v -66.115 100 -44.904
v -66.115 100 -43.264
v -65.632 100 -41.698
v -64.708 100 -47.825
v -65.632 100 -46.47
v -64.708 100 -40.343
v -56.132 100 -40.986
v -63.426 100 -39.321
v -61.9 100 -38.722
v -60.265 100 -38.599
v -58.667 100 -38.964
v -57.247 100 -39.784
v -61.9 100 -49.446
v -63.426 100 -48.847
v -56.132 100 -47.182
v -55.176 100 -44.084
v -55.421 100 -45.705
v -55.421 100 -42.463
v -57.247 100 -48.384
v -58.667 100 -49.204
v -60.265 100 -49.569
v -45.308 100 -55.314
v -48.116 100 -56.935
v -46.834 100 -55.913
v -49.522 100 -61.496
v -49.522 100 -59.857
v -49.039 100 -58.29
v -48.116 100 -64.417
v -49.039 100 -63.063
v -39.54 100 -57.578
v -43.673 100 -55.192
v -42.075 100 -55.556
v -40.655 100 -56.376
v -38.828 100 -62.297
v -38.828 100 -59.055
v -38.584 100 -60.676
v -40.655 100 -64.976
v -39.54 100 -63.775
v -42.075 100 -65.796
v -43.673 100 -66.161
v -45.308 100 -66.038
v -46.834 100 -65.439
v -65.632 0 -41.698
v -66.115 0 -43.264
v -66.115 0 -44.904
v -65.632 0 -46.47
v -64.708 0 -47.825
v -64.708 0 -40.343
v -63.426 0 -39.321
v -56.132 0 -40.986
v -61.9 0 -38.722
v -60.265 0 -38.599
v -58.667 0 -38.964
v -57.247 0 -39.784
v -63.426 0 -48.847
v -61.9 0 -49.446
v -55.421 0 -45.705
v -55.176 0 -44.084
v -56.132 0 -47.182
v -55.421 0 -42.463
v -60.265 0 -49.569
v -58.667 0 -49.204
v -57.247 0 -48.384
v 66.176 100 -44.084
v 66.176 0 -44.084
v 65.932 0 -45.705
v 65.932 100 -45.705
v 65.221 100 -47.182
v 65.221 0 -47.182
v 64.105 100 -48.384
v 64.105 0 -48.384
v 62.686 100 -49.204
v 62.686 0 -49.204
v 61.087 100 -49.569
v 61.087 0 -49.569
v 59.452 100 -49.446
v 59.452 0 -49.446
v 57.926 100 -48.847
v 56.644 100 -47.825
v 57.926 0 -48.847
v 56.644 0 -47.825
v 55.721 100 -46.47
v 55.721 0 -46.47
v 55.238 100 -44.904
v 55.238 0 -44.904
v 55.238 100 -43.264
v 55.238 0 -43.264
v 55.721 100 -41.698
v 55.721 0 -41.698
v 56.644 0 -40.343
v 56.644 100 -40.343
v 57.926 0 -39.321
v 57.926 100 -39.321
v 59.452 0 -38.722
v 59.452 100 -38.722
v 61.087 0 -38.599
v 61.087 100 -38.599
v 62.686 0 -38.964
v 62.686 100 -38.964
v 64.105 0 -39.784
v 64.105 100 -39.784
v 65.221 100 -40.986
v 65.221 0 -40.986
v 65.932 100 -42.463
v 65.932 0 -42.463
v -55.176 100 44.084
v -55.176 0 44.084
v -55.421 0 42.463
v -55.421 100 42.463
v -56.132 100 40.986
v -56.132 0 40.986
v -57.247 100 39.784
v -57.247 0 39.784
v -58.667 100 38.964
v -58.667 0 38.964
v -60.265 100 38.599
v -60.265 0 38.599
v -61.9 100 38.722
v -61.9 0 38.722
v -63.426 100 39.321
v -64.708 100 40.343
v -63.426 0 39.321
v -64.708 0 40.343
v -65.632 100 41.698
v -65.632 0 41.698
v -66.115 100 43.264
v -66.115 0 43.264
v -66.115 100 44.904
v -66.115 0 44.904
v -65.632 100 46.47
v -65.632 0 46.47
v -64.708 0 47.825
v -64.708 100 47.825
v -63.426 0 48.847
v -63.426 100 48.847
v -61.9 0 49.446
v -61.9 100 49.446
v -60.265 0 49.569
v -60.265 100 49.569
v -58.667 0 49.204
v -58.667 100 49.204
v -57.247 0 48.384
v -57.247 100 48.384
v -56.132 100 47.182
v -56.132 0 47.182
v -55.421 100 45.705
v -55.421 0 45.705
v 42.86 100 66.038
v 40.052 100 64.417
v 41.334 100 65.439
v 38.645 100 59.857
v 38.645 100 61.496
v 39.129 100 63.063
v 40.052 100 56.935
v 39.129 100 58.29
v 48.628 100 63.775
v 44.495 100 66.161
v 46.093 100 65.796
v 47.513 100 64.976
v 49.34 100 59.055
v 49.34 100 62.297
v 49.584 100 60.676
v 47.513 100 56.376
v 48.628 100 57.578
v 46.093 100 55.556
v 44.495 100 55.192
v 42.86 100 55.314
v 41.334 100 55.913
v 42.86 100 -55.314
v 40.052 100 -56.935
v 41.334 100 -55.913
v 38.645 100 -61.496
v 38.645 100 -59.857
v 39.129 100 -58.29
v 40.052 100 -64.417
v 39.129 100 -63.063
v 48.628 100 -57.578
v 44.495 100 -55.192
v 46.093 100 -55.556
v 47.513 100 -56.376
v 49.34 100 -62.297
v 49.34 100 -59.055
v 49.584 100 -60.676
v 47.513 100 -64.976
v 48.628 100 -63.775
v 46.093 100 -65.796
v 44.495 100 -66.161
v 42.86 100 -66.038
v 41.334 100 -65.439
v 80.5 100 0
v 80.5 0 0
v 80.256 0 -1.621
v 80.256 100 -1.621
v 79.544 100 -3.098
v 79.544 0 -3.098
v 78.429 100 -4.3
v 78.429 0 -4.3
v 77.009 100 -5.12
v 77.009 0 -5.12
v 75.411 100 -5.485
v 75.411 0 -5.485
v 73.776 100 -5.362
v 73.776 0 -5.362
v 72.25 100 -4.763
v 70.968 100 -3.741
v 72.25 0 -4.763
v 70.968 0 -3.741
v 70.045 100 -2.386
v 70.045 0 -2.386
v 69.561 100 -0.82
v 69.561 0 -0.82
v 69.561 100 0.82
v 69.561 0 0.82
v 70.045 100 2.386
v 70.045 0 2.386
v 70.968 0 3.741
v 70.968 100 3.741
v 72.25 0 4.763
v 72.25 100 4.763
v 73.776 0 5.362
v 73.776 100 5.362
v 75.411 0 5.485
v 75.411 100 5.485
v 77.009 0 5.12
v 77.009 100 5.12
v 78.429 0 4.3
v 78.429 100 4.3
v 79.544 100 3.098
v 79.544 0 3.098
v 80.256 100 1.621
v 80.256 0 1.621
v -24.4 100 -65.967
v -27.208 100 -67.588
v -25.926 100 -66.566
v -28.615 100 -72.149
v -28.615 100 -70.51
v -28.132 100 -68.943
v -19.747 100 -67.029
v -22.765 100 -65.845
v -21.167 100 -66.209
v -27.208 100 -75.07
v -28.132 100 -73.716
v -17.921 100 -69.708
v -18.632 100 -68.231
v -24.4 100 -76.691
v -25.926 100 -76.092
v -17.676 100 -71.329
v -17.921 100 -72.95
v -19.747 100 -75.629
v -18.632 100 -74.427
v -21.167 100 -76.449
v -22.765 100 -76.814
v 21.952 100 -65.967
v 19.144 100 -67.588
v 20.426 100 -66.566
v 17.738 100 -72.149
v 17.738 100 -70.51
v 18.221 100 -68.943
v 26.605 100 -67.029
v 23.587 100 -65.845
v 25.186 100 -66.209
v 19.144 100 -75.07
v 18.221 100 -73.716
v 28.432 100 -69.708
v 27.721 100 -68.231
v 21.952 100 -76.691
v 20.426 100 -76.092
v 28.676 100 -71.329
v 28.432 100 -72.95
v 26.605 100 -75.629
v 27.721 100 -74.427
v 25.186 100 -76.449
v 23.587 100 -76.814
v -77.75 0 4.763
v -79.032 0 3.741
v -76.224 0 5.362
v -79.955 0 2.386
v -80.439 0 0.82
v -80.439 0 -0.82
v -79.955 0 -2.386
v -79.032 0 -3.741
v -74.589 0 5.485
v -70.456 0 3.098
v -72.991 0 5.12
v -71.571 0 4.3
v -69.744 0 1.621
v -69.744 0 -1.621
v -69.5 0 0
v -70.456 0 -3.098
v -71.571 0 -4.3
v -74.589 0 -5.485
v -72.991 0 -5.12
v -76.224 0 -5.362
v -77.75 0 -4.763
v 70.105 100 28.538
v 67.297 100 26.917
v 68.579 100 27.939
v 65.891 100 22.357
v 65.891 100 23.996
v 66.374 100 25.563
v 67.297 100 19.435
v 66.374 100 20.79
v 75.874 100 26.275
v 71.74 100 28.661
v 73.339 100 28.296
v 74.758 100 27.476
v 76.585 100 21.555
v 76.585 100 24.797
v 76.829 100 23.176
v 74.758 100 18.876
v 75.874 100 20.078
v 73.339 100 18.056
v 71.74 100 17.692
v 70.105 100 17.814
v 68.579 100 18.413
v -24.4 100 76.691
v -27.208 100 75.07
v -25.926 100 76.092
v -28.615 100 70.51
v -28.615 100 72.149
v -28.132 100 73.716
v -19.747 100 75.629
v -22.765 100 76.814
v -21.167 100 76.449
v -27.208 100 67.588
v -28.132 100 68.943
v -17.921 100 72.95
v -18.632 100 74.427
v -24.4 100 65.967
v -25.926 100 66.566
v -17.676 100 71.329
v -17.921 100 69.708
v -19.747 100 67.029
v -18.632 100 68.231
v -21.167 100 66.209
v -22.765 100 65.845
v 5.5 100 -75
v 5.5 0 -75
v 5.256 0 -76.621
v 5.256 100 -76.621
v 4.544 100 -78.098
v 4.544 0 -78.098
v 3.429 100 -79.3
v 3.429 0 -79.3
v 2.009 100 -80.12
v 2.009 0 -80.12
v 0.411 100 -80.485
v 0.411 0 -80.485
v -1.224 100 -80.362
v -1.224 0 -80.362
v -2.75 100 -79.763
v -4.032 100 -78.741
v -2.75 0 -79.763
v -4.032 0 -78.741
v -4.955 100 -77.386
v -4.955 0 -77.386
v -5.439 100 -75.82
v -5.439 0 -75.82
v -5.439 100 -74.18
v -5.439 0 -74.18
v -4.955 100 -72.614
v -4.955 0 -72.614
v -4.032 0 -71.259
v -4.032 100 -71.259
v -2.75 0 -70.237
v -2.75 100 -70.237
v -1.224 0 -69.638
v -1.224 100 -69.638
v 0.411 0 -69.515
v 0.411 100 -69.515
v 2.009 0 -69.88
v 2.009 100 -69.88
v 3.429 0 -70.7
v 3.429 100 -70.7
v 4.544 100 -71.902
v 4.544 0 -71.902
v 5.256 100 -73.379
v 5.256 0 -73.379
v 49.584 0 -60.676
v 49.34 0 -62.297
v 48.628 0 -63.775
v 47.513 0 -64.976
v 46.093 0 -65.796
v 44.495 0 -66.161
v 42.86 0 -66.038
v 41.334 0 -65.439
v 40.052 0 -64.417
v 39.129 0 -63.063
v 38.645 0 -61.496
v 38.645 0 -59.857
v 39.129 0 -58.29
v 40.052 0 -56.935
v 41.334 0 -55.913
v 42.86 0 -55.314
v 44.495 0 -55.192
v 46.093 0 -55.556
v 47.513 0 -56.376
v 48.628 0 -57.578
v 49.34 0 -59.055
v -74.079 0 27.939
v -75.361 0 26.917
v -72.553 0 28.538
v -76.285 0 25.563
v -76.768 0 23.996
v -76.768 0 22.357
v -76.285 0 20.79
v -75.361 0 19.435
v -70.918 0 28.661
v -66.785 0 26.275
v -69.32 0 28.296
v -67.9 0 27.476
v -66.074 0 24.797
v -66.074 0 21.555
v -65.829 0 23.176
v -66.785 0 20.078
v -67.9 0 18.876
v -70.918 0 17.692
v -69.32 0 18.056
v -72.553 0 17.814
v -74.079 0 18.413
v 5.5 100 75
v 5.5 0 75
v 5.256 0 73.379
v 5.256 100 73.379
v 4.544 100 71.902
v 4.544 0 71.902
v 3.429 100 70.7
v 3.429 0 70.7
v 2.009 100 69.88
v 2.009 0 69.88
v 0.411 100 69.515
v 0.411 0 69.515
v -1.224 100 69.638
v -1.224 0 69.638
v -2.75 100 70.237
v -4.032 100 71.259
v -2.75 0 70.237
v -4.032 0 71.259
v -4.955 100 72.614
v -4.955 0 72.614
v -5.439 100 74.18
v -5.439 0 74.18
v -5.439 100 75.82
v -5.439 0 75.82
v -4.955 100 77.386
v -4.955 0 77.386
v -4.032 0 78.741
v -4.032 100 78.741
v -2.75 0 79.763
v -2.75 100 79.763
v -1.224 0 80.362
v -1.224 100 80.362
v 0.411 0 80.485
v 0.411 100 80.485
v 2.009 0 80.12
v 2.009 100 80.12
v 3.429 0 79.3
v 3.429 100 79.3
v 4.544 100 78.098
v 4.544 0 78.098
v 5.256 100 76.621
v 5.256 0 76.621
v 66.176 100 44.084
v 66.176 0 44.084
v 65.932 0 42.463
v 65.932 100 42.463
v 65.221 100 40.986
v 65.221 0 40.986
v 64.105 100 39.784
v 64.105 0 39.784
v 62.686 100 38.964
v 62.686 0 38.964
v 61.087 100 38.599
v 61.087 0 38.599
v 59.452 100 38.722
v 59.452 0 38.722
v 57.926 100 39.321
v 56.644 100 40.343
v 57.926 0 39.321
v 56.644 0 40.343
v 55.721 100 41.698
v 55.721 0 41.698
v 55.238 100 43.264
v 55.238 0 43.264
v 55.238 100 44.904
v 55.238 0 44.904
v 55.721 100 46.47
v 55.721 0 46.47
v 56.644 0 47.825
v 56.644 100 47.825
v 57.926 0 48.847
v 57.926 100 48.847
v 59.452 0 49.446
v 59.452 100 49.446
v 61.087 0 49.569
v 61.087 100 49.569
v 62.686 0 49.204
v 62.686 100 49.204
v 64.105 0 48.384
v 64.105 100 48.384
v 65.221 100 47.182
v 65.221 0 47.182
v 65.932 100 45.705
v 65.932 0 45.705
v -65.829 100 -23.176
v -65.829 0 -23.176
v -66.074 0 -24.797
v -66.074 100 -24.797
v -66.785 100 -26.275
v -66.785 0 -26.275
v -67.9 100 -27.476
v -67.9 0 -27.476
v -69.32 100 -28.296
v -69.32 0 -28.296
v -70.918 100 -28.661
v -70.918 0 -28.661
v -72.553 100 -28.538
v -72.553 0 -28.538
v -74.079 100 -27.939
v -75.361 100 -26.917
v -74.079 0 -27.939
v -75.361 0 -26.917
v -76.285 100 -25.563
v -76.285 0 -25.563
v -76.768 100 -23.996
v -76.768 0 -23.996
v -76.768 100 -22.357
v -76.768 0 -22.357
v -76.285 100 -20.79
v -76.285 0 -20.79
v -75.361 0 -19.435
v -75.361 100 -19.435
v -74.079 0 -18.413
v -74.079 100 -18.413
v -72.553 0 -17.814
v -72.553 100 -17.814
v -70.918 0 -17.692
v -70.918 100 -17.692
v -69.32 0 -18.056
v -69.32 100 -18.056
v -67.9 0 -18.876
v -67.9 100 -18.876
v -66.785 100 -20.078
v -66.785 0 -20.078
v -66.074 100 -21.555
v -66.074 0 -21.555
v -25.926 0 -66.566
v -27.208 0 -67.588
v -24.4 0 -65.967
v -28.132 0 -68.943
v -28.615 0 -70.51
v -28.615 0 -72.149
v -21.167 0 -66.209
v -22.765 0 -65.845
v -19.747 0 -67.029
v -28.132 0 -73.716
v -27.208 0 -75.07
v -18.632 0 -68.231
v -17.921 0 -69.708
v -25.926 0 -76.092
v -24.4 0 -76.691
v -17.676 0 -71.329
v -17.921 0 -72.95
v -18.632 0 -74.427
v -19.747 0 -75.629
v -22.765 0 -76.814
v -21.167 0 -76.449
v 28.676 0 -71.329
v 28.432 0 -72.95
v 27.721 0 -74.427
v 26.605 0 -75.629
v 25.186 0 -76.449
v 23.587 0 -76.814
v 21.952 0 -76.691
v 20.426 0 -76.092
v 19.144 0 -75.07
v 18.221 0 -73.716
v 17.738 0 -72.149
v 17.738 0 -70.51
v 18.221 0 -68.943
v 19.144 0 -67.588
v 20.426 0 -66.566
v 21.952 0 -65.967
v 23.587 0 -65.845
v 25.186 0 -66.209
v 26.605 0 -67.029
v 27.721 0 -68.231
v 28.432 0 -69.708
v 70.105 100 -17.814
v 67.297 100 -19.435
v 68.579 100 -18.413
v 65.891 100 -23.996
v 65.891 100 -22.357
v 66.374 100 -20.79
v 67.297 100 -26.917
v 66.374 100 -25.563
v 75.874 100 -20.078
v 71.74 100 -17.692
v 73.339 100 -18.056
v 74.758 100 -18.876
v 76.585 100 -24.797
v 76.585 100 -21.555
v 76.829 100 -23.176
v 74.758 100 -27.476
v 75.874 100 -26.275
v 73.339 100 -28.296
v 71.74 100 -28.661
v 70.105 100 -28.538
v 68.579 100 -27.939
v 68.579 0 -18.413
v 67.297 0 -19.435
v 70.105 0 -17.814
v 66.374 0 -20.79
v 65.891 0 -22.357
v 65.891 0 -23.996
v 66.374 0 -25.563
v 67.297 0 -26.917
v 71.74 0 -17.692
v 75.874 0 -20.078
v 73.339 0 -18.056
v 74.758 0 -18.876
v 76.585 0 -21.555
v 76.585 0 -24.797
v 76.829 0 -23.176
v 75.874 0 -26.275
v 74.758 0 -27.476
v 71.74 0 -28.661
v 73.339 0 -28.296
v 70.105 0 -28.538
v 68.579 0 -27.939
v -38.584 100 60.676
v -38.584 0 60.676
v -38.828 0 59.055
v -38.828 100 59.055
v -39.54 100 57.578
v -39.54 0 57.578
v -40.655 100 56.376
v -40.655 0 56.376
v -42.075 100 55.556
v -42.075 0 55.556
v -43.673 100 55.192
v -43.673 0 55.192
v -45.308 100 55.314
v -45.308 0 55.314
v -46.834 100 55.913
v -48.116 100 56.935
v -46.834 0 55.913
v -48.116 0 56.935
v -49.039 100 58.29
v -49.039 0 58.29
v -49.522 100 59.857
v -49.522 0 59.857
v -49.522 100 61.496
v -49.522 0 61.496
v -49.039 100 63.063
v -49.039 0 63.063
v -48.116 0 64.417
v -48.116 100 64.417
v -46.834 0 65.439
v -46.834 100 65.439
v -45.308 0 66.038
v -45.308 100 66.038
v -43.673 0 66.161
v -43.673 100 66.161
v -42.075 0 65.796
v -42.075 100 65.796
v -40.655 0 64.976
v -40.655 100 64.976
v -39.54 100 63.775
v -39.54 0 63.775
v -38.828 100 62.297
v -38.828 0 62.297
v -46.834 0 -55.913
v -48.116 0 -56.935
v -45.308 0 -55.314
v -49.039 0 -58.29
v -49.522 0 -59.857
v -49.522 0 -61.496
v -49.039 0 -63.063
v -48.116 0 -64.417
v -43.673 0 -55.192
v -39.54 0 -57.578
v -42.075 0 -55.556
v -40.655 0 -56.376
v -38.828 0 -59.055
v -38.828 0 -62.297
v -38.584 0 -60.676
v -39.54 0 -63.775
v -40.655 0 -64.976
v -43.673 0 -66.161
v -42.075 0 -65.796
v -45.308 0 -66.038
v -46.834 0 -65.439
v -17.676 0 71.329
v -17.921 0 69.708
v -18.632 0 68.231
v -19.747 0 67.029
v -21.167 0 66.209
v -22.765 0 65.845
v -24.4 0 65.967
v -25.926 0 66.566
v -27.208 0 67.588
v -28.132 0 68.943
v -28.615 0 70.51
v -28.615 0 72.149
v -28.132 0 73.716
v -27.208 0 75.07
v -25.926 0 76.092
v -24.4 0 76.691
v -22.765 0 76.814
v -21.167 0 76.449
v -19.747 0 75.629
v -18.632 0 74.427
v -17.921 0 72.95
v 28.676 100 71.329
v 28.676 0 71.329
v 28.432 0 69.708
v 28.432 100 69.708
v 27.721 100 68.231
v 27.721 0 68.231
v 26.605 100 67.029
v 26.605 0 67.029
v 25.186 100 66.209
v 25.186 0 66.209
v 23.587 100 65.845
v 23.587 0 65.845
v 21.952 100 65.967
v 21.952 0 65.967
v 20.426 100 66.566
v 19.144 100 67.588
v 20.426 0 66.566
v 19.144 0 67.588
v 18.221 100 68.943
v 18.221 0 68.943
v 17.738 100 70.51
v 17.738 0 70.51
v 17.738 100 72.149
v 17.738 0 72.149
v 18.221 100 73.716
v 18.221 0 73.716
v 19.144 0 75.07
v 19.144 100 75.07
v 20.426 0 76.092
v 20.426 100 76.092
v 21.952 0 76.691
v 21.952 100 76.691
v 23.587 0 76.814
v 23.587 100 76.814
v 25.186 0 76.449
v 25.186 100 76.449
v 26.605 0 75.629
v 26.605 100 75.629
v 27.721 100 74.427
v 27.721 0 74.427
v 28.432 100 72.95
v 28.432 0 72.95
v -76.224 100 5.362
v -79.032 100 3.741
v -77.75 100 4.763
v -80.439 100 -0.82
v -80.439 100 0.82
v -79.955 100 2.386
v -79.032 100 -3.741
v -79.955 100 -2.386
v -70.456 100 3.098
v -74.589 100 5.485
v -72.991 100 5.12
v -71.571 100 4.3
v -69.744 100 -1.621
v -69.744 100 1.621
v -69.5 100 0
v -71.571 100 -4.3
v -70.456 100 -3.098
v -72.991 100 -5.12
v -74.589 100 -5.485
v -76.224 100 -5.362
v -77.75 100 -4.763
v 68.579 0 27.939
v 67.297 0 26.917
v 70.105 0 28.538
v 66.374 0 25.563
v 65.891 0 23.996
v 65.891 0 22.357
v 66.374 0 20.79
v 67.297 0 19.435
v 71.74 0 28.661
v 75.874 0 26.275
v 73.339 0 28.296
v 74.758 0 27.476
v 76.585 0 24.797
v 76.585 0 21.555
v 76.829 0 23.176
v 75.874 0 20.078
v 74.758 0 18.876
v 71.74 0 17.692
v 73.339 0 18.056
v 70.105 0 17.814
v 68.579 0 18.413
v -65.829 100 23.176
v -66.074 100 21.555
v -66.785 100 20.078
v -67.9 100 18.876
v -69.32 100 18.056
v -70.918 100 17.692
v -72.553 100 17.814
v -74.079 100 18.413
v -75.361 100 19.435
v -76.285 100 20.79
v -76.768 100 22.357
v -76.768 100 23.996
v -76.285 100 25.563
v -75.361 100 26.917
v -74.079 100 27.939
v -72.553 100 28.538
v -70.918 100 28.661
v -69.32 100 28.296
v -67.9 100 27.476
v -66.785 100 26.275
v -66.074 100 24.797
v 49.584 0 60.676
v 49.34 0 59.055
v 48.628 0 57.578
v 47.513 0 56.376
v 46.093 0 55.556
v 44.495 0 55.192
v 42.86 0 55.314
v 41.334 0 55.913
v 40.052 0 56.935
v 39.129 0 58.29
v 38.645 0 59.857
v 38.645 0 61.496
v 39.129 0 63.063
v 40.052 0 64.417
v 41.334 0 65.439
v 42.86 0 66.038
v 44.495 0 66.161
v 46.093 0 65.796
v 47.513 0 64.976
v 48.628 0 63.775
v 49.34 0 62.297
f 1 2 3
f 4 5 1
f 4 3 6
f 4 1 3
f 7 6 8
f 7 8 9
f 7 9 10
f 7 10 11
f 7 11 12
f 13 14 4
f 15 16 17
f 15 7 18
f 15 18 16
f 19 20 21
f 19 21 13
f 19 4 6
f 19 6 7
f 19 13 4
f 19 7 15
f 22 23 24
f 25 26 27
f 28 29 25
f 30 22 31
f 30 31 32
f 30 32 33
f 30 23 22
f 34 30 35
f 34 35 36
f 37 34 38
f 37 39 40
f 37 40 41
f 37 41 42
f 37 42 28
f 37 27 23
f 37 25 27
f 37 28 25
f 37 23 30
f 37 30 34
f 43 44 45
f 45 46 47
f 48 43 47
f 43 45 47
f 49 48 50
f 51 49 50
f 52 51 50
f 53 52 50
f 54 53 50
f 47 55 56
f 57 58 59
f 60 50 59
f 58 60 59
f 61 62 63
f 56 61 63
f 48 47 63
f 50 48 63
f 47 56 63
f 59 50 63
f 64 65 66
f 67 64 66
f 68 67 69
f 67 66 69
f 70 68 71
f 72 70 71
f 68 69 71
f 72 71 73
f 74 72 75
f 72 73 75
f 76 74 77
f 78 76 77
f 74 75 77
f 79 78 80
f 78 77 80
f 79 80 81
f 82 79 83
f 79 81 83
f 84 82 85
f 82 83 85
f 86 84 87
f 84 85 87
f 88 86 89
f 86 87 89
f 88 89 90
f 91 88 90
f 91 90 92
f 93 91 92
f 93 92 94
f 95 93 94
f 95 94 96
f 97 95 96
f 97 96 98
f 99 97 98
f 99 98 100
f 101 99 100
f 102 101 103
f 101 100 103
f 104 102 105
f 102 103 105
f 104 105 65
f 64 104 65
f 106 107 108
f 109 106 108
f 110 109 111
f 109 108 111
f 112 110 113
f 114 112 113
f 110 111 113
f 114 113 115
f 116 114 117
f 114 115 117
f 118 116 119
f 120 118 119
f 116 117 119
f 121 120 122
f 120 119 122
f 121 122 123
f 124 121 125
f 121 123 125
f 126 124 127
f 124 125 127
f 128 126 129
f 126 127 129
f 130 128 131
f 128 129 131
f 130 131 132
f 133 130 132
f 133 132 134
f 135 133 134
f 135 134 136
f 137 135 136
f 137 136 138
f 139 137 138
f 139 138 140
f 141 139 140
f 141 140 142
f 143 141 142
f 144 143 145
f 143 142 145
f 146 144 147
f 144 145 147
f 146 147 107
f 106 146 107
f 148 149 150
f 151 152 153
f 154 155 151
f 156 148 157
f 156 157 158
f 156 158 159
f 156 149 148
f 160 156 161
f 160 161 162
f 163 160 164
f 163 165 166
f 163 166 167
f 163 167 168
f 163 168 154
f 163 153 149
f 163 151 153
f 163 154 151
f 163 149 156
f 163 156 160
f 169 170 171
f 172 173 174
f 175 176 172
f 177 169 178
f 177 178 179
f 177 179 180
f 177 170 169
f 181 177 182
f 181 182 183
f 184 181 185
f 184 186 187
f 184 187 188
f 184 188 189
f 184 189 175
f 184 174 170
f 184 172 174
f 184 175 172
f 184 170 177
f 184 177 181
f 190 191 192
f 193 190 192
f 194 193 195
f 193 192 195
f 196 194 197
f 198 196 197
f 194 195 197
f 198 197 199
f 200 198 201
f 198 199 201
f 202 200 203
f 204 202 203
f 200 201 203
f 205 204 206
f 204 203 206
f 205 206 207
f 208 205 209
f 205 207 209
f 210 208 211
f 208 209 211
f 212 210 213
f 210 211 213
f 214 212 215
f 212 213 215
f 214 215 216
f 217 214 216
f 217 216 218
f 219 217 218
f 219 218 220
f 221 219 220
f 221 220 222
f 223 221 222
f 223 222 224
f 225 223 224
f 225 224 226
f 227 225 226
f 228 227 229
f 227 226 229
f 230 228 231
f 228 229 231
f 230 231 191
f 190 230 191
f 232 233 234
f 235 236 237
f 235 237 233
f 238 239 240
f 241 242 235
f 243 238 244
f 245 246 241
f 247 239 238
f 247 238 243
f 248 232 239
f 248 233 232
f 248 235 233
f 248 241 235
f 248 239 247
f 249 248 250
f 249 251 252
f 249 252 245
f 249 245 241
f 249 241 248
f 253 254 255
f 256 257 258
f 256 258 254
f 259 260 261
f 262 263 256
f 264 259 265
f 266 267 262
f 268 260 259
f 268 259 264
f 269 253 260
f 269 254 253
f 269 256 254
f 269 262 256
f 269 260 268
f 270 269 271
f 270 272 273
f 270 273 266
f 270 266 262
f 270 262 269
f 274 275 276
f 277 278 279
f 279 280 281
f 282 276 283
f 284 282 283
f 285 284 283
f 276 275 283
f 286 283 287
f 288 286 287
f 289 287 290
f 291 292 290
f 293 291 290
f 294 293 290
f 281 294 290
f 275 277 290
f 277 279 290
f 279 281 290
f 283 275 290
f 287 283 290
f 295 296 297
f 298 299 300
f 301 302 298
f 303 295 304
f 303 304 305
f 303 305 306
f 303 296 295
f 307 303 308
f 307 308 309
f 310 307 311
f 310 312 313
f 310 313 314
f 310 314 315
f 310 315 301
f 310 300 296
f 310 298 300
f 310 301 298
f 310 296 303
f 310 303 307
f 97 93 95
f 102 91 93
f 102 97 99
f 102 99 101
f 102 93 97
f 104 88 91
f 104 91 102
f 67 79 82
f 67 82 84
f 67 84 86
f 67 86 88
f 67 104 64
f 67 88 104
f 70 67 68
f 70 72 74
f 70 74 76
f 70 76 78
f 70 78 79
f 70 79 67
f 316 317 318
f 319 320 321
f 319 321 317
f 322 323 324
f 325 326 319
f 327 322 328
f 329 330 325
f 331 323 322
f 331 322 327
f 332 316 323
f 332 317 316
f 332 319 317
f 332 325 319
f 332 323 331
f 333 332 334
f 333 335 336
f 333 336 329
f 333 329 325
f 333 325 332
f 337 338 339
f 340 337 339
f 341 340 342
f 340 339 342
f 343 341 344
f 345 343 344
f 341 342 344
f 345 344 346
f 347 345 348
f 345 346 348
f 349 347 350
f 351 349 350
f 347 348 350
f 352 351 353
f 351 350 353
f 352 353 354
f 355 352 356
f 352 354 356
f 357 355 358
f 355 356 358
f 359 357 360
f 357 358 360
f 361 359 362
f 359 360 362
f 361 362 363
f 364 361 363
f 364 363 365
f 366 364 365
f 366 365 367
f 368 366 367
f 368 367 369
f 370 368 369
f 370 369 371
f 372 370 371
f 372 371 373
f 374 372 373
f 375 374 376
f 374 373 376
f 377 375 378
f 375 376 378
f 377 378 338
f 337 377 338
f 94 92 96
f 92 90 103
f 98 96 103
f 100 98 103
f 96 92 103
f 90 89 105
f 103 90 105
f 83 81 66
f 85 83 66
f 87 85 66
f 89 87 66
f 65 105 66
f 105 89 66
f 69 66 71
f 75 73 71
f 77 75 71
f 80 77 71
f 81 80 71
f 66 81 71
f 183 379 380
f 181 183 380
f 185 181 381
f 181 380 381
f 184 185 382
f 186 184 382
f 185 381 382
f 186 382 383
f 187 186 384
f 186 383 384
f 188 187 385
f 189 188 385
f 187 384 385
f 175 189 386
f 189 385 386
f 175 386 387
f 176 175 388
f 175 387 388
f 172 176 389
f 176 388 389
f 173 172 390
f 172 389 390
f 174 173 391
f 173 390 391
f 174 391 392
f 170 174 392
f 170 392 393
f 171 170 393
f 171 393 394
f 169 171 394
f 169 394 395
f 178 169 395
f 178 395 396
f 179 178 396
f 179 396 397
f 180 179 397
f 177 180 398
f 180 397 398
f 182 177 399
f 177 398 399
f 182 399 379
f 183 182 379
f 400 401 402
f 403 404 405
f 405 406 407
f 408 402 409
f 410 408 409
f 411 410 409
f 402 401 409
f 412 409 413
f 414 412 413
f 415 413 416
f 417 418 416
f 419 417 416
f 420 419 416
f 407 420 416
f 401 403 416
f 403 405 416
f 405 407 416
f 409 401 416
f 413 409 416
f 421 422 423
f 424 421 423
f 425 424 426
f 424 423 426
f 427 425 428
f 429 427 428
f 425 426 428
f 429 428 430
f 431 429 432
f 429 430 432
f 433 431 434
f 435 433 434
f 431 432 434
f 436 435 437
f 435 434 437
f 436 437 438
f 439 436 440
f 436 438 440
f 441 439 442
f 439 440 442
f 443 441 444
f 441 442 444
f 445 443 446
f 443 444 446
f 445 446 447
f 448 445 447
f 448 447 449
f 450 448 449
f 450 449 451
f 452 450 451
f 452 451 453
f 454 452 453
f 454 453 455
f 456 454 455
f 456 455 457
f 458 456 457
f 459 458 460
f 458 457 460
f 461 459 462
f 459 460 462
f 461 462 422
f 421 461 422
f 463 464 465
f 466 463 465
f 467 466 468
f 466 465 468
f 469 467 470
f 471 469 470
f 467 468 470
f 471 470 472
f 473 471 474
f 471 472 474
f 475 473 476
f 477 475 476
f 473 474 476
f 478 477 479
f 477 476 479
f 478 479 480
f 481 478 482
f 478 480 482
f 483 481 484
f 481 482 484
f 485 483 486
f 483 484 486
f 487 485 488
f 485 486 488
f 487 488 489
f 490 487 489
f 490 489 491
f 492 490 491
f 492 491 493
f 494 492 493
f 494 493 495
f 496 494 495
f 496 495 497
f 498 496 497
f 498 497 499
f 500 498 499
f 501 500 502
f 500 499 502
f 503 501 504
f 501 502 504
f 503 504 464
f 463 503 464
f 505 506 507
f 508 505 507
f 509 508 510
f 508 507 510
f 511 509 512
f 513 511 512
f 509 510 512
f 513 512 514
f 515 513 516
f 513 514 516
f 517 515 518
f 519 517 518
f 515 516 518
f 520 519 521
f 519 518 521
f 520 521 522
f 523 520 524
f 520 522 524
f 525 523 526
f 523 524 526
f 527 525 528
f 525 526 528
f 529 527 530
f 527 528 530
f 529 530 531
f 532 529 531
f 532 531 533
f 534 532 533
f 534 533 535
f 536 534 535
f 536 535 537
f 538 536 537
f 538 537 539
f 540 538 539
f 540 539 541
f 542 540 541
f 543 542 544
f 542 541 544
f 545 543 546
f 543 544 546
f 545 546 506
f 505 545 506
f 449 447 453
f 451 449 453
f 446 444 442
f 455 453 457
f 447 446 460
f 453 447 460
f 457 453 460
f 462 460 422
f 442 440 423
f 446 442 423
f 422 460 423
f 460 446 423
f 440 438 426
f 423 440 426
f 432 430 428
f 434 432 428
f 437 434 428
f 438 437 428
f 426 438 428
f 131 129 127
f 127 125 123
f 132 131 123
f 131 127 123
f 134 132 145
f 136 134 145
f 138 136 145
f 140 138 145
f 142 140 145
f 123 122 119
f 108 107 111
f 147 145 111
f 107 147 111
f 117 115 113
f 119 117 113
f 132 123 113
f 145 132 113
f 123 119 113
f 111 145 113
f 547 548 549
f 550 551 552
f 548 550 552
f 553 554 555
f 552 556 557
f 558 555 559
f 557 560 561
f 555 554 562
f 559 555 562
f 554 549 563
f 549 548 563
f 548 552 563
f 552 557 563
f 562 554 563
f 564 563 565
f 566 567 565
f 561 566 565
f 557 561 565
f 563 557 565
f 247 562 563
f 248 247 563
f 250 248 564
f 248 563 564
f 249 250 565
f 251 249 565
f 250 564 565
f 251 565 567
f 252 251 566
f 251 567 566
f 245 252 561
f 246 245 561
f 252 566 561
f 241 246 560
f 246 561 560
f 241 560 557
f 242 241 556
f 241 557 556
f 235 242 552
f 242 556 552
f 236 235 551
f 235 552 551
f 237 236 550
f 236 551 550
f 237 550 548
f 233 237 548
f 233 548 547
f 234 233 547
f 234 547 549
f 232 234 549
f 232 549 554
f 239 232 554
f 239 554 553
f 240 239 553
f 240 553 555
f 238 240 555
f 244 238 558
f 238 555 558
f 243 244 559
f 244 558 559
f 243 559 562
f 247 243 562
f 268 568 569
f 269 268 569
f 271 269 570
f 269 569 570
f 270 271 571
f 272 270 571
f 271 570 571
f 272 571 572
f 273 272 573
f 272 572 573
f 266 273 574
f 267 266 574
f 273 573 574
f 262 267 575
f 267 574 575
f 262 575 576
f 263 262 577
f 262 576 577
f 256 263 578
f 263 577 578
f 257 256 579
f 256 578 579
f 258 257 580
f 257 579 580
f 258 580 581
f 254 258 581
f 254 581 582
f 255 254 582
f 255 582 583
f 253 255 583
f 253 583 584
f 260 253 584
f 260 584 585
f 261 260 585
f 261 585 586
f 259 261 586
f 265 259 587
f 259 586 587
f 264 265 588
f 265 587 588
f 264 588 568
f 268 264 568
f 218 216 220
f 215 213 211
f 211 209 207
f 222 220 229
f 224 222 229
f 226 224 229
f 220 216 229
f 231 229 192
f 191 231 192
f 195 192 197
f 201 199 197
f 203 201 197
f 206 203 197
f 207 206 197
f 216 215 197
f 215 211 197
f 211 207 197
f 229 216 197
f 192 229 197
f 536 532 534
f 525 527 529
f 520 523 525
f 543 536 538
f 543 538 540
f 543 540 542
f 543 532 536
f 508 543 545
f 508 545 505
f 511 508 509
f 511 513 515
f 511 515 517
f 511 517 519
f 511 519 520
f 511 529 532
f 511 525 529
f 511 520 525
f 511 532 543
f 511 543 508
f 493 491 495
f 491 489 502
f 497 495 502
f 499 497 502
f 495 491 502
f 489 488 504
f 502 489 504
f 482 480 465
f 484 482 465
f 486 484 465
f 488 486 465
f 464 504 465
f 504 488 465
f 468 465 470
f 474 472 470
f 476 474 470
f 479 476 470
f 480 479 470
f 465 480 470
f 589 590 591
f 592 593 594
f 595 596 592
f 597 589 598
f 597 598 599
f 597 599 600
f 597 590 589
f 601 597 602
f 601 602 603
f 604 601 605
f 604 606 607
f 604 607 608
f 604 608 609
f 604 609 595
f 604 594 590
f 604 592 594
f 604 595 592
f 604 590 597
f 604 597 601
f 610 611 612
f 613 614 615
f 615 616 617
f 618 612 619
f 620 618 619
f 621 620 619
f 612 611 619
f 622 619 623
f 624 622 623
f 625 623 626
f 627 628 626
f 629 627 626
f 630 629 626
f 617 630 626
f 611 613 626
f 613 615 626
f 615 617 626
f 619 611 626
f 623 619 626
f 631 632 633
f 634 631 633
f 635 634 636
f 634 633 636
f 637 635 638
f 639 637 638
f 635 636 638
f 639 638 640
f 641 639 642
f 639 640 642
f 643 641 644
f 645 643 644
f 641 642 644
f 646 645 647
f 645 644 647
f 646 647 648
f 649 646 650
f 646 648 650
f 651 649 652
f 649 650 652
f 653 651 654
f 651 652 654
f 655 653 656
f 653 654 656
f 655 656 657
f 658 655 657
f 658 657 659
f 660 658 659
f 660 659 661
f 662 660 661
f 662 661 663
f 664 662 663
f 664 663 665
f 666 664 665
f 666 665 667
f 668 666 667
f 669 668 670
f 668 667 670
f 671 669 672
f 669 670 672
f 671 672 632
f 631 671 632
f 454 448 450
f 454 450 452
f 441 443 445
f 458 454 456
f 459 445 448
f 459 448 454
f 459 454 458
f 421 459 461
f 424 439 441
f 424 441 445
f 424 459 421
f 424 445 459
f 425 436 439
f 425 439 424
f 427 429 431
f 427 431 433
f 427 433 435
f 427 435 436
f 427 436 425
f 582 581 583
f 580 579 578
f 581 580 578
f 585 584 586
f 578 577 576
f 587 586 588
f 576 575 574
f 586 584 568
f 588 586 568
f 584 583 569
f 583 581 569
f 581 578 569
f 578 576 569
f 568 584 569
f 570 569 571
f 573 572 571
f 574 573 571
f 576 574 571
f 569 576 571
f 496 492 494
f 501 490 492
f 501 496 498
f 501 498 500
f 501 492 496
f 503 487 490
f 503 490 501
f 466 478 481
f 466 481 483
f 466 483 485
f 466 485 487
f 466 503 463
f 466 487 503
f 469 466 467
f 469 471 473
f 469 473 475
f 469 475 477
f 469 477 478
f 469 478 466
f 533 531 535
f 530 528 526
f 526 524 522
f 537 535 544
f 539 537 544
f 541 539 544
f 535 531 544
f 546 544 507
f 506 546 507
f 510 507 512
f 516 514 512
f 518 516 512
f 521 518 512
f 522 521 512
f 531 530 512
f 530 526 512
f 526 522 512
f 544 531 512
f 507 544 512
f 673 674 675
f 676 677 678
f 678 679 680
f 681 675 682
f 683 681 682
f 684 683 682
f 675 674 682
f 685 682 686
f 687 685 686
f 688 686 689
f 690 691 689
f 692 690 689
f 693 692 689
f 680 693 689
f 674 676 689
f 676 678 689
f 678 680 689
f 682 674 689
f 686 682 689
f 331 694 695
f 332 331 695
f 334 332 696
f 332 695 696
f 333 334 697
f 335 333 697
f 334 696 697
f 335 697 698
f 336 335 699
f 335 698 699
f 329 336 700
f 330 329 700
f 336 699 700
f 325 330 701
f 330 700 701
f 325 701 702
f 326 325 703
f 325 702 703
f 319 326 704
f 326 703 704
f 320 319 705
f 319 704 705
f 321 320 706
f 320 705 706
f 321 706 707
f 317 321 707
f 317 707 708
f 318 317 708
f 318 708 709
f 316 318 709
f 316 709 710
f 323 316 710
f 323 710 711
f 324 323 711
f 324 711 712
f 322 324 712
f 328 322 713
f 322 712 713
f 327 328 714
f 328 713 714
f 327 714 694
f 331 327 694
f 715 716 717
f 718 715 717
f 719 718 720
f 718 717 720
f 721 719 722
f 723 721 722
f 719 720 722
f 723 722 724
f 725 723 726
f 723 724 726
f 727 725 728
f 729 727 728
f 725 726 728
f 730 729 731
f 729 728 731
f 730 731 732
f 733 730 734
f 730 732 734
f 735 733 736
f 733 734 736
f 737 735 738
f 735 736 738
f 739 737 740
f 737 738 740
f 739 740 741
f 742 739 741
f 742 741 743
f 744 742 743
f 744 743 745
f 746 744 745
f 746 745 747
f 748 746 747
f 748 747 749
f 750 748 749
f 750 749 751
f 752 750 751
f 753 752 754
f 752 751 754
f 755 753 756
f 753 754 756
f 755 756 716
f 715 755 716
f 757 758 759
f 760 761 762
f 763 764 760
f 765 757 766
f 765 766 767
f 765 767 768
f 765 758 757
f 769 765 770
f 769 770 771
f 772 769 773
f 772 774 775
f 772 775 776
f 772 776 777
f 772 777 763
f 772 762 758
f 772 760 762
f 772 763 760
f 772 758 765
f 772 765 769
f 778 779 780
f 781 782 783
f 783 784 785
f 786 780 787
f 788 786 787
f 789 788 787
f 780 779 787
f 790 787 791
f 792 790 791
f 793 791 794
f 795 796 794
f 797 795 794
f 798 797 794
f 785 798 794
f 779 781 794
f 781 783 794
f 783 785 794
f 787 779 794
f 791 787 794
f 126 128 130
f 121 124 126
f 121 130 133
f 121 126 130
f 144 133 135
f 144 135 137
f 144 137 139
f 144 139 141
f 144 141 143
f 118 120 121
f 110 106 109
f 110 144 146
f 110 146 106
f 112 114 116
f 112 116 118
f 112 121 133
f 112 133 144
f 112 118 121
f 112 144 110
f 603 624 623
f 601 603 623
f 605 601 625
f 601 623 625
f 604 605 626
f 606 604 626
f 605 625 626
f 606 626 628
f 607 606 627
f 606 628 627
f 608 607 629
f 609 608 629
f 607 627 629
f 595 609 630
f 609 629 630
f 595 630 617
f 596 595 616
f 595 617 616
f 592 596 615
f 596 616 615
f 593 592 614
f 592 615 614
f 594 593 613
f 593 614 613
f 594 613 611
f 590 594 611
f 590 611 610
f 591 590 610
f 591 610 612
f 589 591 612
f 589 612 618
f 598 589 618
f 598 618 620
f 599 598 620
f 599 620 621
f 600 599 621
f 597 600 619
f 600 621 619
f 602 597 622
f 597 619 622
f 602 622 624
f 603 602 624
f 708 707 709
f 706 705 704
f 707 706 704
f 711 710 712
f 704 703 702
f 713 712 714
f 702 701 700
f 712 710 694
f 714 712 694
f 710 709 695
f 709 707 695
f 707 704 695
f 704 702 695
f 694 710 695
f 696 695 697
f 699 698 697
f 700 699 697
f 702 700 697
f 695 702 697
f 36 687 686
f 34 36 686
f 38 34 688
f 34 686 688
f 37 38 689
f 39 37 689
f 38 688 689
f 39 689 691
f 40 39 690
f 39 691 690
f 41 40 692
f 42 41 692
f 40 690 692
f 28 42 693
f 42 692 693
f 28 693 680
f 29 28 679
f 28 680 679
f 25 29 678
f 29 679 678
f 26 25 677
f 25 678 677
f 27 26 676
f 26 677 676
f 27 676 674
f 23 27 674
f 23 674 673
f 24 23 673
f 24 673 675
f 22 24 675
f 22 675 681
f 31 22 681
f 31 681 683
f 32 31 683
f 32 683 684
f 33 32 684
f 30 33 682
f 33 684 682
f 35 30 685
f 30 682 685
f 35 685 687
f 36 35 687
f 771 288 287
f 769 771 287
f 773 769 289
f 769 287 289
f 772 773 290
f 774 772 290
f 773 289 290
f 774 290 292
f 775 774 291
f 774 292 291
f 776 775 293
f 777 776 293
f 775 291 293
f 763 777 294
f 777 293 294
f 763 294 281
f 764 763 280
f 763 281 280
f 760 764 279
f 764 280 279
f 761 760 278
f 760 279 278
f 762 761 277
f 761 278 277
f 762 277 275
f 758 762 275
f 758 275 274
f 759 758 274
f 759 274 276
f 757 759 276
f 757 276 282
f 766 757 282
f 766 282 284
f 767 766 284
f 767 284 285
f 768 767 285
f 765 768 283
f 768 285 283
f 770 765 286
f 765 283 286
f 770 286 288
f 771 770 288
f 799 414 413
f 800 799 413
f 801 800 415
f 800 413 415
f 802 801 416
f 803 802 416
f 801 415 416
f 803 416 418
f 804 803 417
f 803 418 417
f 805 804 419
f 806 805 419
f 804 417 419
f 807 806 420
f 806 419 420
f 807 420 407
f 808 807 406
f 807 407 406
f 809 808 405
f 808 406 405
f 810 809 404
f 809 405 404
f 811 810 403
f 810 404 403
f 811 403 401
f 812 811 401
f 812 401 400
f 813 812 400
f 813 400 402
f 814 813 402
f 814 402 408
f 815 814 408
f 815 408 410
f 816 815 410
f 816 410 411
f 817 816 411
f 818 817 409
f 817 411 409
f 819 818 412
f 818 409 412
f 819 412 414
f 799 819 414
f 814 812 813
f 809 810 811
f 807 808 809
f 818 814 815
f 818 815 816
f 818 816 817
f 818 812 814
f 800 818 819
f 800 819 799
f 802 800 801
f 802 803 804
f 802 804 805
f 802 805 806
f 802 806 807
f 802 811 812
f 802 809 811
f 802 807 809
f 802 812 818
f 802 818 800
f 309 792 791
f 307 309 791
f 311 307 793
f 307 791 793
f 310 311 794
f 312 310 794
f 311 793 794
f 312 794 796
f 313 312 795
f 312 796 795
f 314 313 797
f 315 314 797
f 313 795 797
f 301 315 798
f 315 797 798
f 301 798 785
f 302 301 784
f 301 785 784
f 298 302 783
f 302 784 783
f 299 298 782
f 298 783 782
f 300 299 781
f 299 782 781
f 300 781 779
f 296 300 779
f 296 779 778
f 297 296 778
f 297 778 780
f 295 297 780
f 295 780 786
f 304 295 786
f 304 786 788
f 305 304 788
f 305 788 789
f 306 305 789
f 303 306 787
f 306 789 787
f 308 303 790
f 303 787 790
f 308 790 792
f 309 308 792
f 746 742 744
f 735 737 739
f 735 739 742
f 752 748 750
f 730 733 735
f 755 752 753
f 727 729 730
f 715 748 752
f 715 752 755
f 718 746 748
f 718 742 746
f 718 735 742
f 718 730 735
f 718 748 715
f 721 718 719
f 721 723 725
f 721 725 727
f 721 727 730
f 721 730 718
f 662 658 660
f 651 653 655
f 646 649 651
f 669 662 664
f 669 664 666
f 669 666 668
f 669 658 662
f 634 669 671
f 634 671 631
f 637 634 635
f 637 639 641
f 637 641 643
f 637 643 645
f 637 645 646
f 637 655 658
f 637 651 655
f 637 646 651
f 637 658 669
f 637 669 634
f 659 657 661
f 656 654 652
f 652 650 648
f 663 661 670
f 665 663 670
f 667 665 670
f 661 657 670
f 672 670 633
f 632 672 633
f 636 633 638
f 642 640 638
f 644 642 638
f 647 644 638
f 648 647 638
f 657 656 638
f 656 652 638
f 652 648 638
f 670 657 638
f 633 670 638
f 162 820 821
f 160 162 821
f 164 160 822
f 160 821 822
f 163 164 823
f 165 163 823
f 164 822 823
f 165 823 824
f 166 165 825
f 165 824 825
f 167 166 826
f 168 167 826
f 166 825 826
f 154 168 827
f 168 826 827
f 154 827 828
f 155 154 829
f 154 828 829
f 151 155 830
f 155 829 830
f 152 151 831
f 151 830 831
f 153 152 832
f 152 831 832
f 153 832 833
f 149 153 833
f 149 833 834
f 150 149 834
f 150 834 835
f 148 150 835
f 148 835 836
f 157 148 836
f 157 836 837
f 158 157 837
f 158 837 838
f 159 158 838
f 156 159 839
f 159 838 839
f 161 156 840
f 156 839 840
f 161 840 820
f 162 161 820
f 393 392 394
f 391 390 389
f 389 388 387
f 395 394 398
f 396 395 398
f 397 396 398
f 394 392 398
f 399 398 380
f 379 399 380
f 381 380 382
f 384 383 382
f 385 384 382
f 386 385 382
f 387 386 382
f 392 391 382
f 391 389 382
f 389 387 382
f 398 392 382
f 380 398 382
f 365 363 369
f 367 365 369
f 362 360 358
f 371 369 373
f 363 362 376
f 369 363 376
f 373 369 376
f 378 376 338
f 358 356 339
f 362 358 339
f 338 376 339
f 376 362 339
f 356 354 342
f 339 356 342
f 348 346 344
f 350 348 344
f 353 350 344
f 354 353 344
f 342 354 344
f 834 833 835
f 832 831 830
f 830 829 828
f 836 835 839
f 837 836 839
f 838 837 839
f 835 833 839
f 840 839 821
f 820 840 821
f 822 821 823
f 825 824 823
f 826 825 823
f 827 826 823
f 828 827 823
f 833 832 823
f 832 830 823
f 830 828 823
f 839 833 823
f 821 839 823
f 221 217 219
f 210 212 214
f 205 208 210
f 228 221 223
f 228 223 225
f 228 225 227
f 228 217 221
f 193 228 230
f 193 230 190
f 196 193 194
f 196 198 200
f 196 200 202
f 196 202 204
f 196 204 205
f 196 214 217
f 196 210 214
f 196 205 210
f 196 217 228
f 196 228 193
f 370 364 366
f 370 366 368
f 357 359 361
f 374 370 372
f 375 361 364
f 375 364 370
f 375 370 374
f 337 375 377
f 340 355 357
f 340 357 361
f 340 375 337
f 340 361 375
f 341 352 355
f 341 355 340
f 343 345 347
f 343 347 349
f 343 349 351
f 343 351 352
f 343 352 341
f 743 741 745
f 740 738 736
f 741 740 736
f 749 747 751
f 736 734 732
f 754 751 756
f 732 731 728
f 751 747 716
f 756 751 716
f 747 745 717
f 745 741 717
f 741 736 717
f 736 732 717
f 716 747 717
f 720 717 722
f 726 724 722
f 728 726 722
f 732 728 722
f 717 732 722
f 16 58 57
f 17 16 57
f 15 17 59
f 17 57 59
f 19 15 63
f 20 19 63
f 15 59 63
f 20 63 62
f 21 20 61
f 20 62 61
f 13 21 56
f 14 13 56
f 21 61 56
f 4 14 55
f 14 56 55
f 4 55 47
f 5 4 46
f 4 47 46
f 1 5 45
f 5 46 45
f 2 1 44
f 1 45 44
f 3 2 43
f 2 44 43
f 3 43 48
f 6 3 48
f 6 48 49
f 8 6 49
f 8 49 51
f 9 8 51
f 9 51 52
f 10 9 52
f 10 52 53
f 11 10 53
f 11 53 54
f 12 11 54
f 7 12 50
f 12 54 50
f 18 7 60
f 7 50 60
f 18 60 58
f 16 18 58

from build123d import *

# Parameters (mm, degrees)
SKETCH1_R              = 5.5
BOSS_EXTRUDE1_DEPTH    = 100
BOSS_EXTRUDE1_2_DEPTH  = 100
BOSS_EXTRUDE1_3_DEPTH  = 100
BOSS_EXTRUDE1_4_DEPTH  = 100
BOSS_EXTRUDE1_5_DEPTH  = 100
BOSS_EXTRUDE1_6_DEPTH  = 100
BOSS_EXTRUDE1_7_DEPTH  = 100
BOSS_EXTRUDE1_8_DEPTH  = 100
BOSS_EXTRUDE1_9_DEPTH  = 100
BOSS_EXTRUDE1_10_DEPTH = 100
BOSS_EXTRUDE1_11_DEPTH = 100
BOSS_EXTRUDE1_12_DEPTH = 100
BOSS_EXTRUDE1_13_DEPTH = 100
BOSS_EXTRUDE1_14_DEPTH = 100
BOSS_EXTRUDE1_15_DEPTH = 100
BOSS_EXTRUDE1_16_DEPTH = 100
BOSS_EXTRUDE1_17_DEPTH = 100
BOSS_EXTRUDE1_18_DEPTH = 100
BOSS_EXTRUDE1_19_DEPTH = 100
BOSS_EXTRUDE1_20_DEPTH = 100


with BuildPart() as part:
    # Sketch1 → Boss-Extrude1 (new body)
    with BuildSketch(Plane(origin=(0, 0, 0), x_dir=(1, 0, 0), z_dir=(0, 1, 0))):
        with Locations((0, 75)):
            Circle(SKETCH1_R)
    extrude(amount=BOSS_EXTRUDE1_DEPTH)


with BuildPart() as body_2:
    # Sketch1 → Boss-Extrude1 2 (new body)
    with BuildSketch(Plane(origin=(0, 0, 0), x_dir=(1, 0, 0), z_dir=(0, 1, 0))):
        with Locations((23.176274578, 71.329238722)):
            Circle(SKETCH1_R)
    extrude(amount=BOSS_EXTRUDE1_2_DEPTH)


with BuildPart() as body_3:
    # Sketch1 → Boss-Extrude1 3 (new body)
    with BuildSketch(Plane(origin=(0, 0, 0), x_dir=(1, 0, 0), z_dir=(0, 1, 0))):
        with Locations((44.083893922, 60.676274578)):
            Circle(SKETCH1_R)
    extrude(amount=BOSS_EXTRUDE1_3_DEPTH)


with BuildPart() as body_4:
    # Sketch1 → Boss-Extrude1 4 (new body)
    with BuildSketch(Plane(origin=(0, 0, 0), x_dir=(1, 0, 0), z_dir=(0, 1, 0))):
        with Locations((60.676274578, 44.083893922)):
            Circle(SKETCH1_R)
    extrude(amount=BOSS_EXTRUDE1_4_DEPTH)


with BuildPart() as body_5:
    # Sketch1 → Boss-Extrude1 5 (new body)
    with BuildSketch(Plane(origin=(0, 0, 0), x_dir=(1, 0, 0), z_dir=(0, 1, 0))):
        with Locations((71.329238722, 23.176274578)):
            Circle(SKETCH1_R)
    extrude(amount=BOSS_EXTRUDE1_5_DEPTH)


with BuildPart() as body_6:
    # Sketch1 → Boss-Extrude1 6 (new body)
    with BuildSketch(Plane(origin=(0, 0, 0), x_dir=(1, 0, 0), z_dir=(0, 1, 0))):
        with Locations((75, 0)):
            Circle(SKETCH1_R)
    extrude(amount=BOSS_EXTRUDE1_6_DEPTH)


with BuildPart() as body_7:
    # Sketch1 → Boss-Extrude1 7 (new body)
    with BuildSketch(Plane(origin=(0, 0, 0), x_dir=(1, 0, 0), z_dir=(0, 1, 0))):
        with Locations((71.329238722, -23.176274578)):
            Circle(SKETCH1_R)
    extrude(amount=BOSS_EXTRUDE1_7_DEPTH)


with BuildPart() as body_8:
    # Sketch1 → Boss-Extrude1 8 (new body)
    with BuildSketch(Plane(origin=(0, 0, 0), x_dir=(1, 0, 0), z_dir=(0, 1, 0))):
        with Locations((60.676274578, -44.083893922)):
            Circle(SKETCH1_R)
    extrude(amount=BOSS_EXTRUDE1_8_DEPTH)


with BuildPart() as body_9:
    # Sketch1 → Boss-Extrude1 9 (new body)
    with BuildSketch(Plane(origin=(0, 0, 0), x_dir=(1, 0, 0), z_dir=(0, 1, 0))):
        with Locations((44.083893922, -60.676274578)):
            Circle(SKETCH1_R)
    extrude(amount=BOSS_EXTRUDE1_9_DEPTH)


with BuildPart() as body_10:
    # Sketch1 → Boss-Extrude1 10 (new body)
    with BuildSketch(Plane(origin=(0, 0, 0), x_dir=(1, 0, 0), z_dir=(0, 1, 0))):
        with Locations((23.176274578, -71.329238722)):
            Circle(SKETCH1_R)
    extrude(amount=BOSS_EXTRUDE1_10_DEPTH)


with BuildPart() as body_11:
    # Sketch1 → Boss-Extrude1 11 (new body)
    with BuildSketch(Plane(origin=(0, 0, 0), x_dir=(1, 0, 0), z_dir=(0, 1, 0))):
        with Locations((0, -75)):
            Circle(SKETCH1_R)
    extrude(amount=BOSS_EXTRUDE1_11_DEPTH)


with BuildPart() as body_12:
    # Sketch1 → Boss-Extrude1 12 (new body)
    with BuildSketch(Plane(origin=(0, 0, 0), x_dir=(1, 0, 0), z_dir=(0, 1, 0))):
        with Locations((-23.176274578, -71.329238722)):
            Circle(SKETCH1_R)
    extrude(amount=BOSS_EXTRUDE1_12_DEPTH)


with BuildPart() as body_13:
    # Sketch1 → Boss-Extrude1 13 (new body)
    with BuildSketch(Plane(origin=(0, 0, 0), x_dir=(1, 0, 0), z_dir=(0, 1, 0))):
        with Locations((-44.083893922, -60.676274578)):
            Circle(SKETCH1_R)
    extrude(amount=BOSS_EXTRUDE1_13_DEPTH)


with BuildPart() as body_14:
    # Sketch1 → Boss-Extrude1 14 (new body)
    with BuildSketch(Plane(origin=(0, 0, 0), x_dir=(1, 0, 0), z_dir=(0, 1, 0))):
        with Locations((-60.676274578, -44.083893922)):
            Circle(SKETCH1_R)
    extrude(amount=BOSS_EXTRUDE1_14_DEPTH)


with BuildPart() as body_15:
    # Sketch1 → Boss-Extrude1 15 (new body)
    with BuildSketch(Plane(origin=(0, 0, 0), x_dir=(1, 0, 0), z_dir=(0, 1, 0))):
        with Locations((-71.329238722, -23.176274578)):
            Circle(SKETCH1_R)
    extrude(amount=BOSS_EXTRUDE1_15_DEPTH)


with BuildPart() as body_16:
    # Sketch1 → Boss-Extrude1 16 (new body)
    with BuildSketch(Plane(origin=(0, 0, 0), x_dir=(1, 0, 0), z_dir=(0, 1, 0))):
        with Locations((-75, 0)):
            Circle(SKETCH1_R)
    extrude(amount=BOSS_EXTRUDE1_16_DEPTH)


with BuildPart() as body_17:
    # Sketch1 → Boss-Extrude1 17 (new body)
    with BuildSketch(Plane(origin=(0, 0, 0), x_dir=(1, 0, 0), z_dir=(0, 1, 0))):
        with Locations((-71.329238722, 23.176274578)):
            Circle(SKETCH1_R)
    extrude(amount=BOSS_EXTRUDE1_17_DEPTH)


with BuildPart() as body_18:
    # Sketch1 → Boss-Extrude1 18 (new body)
    with BuildSketch(Plane(origin=(0, 0, 0), x_dir=(1, 0, 0), z_dir=(0, 1, 0))):
        with Locations((-60.676274578, 44.083893922)):
            Circle(SKETCH1_R)
    extrude(amount=BOSS_EXTRUDE1_18_DEPTH)


with BuildPart() as body_19:
    # Sketch1 → Boss-Extrude1 19 (new body)
    with BuildSketch(Plane(origin=(0, 0, 0), x_dir=(1, 0, 0), z_dir=(0, 1, 0))):
        with Locations((-44.083893922, 60.676274578)):
            Circle(SKETCH1_R)
    extrude(amount=BOSS_EXTRUDE1_19_DEPTH)


with BuildPart() as body_20:
    # Sketch1 → Boss-Extrude1 20 (new body)
    with BuildSketch(Plane(origin=(0, 0, 0), x_dir=(1, 0, 0), z_dir=(0, 1, 0))):
        with Locations((-23.176274578, 71.329238722)):
            Circle(SKETCH1_R)
    extrude(amount=BOSS_EXTRUDE1_20_DEPTH)


solid = Compound([part.part, body_2.part, body_3.part, body_4.part, body_5.part, body_6.part, body_7.part, body_8.part, body_9.part, body_10.part, body_11.part, body_12.part, body_13.part, body_14.part, body_15.part, body_16.part, body_17.part, body_18.part, body_19.part, body_20.part])
